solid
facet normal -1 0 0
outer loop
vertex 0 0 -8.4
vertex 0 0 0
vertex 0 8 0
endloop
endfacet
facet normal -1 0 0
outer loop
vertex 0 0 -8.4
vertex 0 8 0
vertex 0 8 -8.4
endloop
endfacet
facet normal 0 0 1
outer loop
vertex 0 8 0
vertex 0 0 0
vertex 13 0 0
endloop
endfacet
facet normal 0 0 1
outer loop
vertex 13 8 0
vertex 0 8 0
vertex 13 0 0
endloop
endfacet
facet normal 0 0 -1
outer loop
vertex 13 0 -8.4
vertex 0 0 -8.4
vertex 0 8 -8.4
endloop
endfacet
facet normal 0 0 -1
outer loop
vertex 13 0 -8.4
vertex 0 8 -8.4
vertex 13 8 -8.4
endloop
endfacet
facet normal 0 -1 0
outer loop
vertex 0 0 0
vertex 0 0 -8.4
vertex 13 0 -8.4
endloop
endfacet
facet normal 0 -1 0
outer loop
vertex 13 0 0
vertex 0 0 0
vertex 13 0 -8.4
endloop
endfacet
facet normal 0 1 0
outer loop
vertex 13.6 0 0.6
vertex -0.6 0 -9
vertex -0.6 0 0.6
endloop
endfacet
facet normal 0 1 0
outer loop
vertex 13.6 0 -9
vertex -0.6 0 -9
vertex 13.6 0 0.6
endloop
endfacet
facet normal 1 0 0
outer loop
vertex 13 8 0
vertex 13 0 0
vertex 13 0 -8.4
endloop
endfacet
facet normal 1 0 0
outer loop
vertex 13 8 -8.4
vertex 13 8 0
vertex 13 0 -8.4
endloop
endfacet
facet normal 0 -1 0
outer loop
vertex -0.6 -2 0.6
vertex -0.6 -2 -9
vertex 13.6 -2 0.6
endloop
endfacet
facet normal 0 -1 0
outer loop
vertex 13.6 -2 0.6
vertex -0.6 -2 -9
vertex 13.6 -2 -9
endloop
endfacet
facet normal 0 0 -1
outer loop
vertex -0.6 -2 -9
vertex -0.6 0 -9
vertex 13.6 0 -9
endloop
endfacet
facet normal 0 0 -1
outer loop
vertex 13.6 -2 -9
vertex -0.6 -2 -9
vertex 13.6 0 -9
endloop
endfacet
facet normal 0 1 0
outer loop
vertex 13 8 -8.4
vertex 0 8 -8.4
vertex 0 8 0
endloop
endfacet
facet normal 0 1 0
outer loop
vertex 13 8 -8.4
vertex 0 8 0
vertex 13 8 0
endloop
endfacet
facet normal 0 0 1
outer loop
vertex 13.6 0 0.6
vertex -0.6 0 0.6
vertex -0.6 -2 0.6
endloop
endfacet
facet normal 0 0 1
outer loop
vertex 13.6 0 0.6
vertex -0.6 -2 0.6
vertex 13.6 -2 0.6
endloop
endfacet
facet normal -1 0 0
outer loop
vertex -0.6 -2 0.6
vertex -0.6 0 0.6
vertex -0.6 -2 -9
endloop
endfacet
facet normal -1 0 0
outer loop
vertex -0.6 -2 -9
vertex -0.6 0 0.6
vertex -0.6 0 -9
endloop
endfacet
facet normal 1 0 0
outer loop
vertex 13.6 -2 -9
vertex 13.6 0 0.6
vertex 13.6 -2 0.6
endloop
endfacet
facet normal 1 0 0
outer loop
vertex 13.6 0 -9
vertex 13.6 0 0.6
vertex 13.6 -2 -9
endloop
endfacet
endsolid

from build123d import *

# Parameters (mm, degrees)
SKETCH_1_W      = 13
SKETCH_1_H      = 8.4
EXTRUDE_1_DEPTH = 8
SKETCH_1_3_W    = 14.2
SKETCH_1_3_H    = 9.6
EXTRUDE_2_DEPTH = 2


with BuildPart() as part:
    # 草图1 → 凸台-拉伸1 (new body)
    with BuildSketch(Plane(origin=(0, 0, 0), x_dir=(1, 0, 0), z_dir=(0, 1, 0))):
        with Locations((6.5, 4.2)):
            Rectangle(SKETCH_1_W, SKETCH_1_H)
    extrude(amount=EXTRUDE_1_DEPTH)


with BuildPart() as body_2:
    # 草图1<3> → 凸台-拉伸2 (new body)
    with BuildSketch(Plane(origin=(0, 0, 0), x_dir=(1, 0, 0), z_dir=(0, 1, 0))):
        with Locations((6.5, 4.2)):
            Rectangle(SKETCH_1_3_W, SKETCH_1_3_H)
    extrude(amount=-EXTRUDE_2_DEPTH)


solid = Compound([part.part, body_2.part])
